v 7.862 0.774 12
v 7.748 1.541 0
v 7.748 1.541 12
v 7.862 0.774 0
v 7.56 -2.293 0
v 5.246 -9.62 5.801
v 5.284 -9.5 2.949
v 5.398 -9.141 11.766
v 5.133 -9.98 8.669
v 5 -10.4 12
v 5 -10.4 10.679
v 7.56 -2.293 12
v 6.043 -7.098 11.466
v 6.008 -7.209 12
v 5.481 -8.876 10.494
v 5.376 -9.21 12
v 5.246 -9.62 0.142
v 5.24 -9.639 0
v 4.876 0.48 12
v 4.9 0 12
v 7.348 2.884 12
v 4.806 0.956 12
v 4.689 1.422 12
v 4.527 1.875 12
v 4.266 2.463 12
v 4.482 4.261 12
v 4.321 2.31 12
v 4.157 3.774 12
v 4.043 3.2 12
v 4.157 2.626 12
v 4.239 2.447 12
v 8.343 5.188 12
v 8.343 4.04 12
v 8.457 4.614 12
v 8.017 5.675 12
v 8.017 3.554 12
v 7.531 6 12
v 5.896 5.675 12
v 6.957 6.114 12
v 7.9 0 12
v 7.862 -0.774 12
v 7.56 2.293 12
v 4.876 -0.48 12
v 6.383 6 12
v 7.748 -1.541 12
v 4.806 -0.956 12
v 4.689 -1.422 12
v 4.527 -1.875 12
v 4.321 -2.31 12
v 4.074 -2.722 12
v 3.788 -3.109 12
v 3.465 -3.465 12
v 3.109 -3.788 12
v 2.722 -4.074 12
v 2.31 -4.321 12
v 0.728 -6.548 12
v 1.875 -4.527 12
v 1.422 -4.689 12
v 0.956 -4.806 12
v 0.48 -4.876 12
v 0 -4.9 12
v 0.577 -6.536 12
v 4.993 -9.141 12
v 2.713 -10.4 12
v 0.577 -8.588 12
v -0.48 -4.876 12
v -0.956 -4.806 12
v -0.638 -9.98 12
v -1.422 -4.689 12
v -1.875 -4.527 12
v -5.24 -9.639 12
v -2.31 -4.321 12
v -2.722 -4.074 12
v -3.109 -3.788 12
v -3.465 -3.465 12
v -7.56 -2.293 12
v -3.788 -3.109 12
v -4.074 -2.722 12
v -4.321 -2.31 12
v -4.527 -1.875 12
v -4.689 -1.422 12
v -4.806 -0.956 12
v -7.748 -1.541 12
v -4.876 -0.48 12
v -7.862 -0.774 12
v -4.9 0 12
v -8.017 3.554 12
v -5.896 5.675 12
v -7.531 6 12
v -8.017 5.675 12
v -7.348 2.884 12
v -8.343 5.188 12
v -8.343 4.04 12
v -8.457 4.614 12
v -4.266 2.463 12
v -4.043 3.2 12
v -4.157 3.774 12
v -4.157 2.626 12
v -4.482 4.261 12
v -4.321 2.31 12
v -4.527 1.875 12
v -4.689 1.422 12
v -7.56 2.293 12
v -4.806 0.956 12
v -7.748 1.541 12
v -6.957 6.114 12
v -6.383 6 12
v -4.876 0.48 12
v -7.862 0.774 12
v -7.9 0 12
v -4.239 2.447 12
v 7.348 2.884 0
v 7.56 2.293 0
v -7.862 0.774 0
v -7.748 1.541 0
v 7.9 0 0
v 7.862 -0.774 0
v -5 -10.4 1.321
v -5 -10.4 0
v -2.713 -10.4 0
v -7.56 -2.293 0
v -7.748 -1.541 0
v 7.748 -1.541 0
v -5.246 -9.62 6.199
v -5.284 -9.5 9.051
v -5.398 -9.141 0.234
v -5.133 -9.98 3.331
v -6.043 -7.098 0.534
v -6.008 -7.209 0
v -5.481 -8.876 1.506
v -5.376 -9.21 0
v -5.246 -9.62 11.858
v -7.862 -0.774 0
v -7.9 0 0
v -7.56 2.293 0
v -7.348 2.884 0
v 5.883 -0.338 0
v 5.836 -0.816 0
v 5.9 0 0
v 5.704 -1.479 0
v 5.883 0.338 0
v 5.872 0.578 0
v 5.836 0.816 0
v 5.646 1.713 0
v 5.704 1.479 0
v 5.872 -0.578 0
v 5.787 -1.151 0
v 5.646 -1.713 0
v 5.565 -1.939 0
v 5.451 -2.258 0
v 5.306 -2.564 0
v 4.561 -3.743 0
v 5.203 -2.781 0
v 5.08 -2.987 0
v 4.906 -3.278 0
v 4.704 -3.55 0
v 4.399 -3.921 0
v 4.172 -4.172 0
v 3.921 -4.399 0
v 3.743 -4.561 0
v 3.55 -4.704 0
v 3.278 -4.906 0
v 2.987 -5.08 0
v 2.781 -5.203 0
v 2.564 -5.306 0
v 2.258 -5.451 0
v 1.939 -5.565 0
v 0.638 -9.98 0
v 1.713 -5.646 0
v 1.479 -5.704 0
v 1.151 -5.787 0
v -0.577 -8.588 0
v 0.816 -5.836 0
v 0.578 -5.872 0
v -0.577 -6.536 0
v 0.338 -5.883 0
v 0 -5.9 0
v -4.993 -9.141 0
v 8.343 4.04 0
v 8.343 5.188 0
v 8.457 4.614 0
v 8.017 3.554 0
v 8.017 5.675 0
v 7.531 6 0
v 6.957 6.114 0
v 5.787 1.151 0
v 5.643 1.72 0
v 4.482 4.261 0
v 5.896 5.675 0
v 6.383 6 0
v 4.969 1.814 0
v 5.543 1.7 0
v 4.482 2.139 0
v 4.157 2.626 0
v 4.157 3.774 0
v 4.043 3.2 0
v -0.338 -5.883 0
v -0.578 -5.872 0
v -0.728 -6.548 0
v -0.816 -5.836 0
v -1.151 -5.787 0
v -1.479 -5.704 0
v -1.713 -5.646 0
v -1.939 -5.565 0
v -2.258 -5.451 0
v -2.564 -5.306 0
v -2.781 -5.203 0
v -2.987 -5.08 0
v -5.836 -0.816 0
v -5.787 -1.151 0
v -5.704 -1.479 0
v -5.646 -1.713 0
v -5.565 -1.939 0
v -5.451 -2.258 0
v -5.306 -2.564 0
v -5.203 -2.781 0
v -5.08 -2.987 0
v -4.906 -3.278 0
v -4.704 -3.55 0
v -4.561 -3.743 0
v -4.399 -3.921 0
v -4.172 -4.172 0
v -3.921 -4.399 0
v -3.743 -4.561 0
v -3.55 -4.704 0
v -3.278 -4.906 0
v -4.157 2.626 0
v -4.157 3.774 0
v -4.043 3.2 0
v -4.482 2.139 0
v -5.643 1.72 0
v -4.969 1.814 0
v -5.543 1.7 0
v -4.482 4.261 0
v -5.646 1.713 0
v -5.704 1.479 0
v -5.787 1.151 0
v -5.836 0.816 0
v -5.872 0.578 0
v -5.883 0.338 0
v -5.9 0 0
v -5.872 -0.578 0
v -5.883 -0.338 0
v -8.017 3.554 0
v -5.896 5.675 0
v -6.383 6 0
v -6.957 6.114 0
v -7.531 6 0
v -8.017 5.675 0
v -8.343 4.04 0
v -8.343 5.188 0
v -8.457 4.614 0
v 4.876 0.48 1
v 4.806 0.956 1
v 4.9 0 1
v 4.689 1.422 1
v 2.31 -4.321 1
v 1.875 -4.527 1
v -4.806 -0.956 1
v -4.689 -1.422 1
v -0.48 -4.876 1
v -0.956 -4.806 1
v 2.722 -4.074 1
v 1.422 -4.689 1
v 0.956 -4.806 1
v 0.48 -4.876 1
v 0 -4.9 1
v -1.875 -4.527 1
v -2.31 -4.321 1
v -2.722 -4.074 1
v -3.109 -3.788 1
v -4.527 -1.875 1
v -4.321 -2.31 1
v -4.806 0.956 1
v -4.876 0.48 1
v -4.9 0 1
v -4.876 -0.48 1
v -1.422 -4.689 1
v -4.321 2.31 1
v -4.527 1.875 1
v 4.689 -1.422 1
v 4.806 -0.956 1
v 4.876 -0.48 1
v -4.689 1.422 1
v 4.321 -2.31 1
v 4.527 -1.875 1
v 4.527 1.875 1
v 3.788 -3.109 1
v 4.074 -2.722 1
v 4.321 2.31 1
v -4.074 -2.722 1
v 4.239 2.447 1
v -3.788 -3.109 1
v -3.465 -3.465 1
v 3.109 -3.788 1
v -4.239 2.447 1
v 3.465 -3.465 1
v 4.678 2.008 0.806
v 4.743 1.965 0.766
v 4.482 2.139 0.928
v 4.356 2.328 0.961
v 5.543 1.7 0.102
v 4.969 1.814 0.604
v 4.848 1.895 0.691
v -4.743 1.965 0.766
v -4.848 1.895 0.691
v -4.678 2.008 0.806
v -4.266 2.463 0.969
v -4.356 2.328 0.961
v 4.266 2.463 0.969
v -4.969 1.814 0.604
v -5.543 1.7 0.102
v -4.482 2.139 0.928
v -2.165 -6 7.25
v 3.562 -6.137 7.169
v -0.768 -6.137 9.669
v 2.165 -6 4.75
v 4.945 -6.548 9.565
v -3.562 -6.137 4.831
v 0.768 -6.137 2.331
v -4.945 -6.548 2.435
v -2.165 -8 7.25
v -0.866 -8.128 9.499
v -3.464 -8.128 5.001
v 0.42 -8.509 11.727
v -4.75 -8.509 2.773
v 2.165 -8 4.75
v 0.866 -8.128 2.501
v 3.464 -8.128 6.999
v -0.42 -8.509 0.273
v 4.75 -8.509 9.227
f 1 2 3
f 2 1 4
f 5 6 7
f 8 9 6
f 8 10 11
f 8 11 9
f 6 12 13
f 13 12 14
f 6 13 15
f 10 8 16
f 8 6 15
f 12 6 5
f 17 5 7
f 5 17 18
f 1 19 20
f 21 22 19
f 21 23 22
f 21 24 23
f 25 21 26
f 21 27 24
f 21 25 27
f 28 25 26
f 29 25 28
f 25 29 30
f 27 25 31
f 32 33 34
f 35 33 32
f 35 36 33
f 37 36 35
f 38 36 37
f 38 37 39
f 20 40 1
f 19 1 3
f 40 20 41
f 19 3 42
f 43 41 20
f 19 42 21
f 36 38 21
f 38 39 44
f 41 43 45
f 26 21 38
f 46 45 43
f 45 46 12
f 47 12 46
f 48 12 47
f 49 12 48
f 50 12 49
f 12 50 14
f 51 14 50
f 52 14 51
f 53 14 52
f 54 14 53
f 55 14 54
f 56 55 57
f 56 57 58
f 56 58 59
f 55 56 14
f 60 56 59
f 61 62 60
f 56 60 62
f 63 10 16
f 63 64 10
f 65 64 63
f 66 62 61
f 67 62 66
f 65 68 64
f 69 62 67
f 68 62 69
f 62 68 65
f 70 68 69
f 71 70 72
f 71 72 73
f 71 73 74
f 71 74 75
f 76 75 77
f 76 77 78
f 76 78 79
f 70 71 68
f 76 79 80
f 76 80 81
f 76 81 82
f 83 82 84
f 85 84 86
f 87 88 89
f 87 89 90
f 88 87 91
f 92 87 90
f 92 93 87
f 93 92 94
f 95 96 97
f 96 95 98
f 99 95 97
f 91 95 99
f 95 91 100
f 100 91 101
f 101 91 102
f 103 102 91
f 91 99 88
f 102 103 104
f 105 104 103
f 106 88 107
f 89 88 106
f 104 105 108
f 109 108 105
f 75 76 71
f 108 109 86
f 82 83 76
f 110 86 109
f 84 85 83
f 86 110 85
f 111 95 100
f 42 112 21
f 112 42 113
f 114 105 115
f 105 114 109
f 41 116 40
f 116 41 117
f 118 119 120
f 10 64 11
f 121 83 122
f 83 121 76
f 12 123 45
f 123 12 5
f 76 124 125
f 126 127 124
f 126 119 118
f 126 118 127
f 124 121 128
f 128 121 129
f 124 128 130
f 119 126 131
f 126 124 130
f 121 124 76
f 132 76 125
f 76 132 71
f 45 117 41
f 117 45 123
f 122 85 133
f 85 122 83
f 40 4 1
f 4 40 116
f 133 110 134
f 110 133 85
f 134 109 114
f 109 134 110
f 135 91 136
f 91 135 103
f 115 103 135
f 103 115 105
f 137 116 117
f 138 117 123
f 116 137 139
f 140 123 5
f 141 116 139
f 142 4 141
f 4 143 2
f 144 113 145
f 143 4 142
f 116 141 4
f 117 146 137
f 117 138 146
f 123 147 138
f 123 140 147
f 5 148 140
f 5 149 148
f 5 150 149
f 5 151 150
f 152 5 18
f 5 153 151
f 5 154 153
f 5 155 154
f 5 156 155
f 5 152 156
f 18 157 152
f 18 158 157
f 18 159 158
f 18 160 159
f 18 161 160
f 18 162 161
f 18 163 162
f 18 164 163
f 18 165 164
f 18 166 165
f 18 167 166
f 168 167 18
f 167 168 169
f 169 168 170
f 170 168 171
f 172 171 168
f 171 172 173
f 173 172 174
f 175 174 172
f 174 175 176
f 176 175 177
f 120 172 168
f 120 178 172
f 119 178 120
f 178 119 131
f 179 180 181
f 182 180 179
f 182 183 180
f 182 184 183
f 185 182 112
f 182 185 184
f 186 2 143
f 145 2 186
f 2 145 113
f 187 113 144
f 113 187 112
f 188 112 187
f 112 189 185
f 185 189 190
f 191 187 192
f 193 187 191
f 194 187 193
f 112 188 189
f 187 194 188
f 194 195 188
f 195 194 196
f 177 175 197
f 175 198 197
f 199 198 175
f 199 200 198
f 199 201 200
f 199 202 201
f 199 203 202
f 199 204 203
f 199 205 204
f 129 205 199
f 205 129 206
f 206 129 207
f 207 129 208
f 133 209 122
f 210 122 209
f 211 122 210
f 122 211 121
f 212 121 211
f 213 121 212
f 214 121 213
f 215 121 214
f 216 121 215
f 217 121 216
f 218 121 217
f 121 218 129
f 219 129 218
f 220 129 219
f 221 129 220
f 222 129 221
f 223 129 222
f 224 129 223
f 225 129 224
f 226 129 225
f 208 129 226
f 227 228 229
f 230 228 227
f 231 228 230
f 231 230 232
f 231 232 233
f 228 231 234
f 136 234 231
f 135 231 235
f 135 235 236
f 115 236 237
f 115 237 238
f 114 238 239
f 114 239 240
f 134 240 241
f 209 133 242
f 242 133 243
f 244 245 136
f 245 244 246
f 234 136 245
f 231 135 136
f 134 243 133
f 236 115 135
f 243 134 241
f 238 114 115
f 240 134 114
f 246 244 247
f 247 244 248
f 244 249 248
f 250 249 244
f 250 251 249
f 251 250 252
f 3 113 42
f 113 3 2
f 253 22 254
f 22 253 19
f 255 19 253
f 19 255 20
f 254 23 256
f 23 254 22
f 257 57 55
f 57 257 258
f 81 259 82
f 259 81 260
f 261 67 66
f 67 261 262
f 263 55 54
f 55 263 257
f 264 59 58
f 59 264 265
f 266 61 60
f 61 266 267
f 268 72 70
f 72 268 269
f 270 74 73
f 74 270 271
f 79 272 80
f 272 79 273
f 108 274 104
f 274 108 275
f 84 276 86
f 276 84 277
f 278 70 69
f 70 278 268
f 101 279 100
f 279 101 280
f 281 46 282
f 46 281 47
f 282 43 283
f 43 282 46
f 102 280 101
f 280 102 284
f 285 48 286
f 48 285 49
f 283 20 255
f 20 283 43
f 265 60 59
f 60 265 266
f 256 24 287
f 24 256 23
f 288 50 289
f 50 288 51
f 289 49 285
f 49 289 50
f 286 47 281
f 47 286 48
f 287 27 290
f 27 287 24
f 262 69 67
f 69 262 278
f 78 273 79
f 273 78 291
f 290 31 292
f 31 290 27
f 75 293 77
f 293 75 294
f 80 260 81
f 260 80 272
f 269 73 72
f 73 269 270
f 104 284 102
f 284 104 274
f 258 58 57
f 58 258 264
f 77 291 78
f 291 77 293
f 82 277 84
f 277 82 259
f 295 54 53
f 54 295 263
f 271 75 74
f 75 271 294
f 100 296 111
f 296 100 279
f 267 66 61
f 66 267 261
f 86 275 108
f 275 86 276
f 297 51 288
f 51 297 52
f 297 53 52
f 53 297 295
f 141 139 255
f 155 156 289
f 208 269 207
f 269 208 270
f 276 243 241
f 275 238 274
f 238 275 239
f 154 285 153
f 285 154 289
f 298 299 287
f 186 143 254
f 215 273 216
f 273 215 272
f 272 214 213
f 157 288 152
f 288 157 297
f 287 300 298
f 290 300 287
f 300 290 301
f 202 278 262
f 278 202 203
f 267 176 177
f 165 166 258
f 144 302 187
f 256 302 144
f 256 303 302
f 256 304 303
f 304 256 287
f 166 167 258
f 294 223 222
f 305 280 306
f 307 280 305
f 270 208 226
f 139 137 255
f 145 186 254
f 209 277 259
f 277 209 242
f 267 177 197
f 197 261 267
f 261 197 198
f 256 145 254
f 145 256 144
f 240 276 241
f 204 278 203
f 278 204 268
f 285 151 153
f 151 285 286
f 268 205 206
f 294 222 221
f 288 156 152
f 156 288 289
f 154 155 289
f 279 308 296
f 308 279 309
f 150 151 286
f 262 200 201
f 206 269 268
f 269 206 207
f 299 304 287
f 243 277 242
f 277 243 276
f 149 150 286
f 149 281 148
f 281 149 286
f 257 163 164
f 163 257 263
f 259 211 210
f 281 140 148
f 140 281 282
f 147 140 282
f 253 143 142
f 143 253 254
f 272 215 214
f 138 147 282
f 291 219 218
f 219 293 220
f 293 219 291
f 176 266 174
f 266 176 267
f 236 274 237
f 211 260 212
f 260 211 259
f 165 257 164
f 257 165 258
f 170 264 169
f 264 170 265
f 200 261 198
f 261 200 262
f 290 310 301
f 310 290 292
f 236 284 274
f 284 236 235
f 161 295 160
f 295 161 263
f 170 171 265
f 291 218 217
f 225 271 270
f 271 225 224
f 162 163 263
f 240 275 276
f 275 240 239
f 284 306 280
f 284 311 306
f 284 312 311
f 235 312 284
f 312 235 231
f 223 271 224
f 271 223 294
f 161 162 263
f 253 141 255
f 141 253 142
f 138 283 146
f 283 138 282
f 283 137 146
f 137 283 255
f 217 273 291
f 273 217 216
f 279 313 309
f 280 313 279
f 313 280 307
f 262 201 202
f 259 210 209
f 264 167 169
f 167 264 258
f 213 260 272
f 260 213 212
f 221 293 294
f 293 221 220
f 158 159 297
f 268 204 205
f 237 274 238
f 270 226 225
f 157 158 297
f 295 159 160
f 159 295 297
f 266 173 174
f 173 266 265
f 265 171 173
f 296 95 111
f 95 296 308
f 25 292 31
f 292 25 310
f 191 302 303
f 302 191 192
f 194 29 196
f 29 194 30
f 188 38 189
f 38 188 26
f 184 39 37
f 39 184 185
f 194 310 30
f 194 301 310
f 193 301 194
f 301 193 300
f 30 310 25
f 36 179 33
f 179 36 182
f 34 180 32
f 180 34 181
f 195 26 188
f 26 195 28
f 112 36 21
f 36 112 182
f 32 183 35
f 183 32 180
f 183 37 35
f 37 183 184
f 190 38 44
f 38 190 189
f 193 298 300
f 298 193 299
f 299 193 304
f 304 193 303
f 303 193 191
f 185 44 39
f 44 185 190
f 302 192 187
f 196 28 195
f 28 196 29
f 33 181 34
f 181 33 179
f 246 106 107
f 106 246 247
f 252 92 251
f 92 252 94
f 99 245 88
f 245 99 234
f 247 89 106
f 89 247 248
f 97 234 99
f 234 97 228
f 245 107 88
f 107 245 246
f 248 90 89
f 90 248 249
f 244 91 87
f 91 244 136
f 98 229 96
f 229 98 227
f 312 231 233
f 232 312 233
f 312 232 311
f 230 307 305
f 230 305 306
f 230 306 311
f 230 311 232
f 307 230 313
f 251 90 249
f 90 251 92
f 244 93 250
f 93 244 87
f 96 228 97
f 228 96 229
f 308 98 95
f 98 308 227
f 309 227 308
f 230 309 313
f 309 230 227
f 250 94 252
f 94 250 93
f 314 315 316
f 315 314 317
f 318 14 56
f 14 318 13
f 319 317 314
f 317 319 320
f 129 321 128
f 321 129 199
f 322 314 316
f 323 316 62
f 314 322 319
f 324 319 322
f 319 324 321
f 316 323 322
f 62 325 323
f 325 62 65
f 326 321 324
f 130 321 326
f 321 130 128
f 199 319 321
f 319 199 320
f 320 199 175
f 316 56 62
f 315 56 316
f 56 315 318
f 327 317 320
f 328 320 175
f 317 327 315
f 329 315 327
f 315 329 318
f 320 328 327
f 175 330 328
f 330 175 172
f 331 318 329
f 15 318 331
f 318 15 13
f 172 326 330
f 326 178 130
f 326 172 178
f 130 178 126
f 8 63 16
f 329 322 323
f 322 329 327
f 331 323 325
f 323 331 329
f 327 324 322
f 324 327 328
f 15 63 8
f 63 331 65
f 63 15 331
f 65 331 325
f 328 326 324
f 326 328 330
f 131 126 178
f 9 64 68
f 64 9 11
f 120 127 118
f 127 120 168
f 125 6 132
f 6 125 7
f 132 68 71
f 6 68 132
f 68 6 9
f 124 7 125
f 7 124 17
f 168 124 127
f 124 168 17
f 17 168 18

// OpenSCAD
// file: cylinder_clip.scad
use <../utilities.scad>;

module cylinder_clip(r=1,t=3,opening_angle=120,wing_length=2,wing_angle=45,flat_w=10,flat_t=3,h=10,$fn=$fn){
	union(){
		difference(){
			hull(){
				cylinder(r=r+t,$fn=$fn,h=h);
				translate([-flat_w/2,-r-flat_t,0]) cube([flat_w,0.1,h]);
			}
			cylinder(r=r,$fn=$fn,h=99999,center=true);
			cylinder(r1=r+2,r2=r,$fn=$fn,h=2,center=true);
			scale([tan(opening_angle/2),1,1]) rotate([0,0,45]) translate([0,0,-1]) cube([1,1,1]*9999);
		}
		reflect([1,0,0]) translate([sin(opening_angle/2),cos(opening_angle/2),0]*(r+t/2)) hull() repeat([sin(wing_angle),cos(wing_angle),0]*wing_length,2)
			cylinder(r=t/2,h=h,$fn=16);
			
	}
}

//cylinder_clip(r=3,t=2,flat_w=6);
union(){
	cylinder_clip(r=21,t=4.5,flat_t=10,opening_angle=100,$fn=64);
	translate([-5,-22-5-20,0]) cube([10,20,10]);
}
// main file
use <../utilities.scad>;
use <./cylinder_clip.scad>;

$fn=64;

tube_r = 25;
tube_to_rack = 4.5; //was 6 for smaller clips

module annulus(inner_r,thickness,h,center=false){
	difference(){
		cylinder(r=inner_r+thickness,h=h,center=center);
		cylinder(r=inner_r,h=99999,center=true);
	}
}
module cable_tie(inner_r,center=false){
	annulus(inner_r+1.5,2,5,center=center);
}
difference(){
	cylinder_clip(r=5-0.1,t=3,flat_t=tube_to_rack+1,h=12);
	translate([0,-5-tube_to_rack-tube_r,12/2]) rotate([0,120,0]){
#		cylinder(r=tube_r,h=999,center=true);
		cable_tie(tube_r,center=true);
	}
}
